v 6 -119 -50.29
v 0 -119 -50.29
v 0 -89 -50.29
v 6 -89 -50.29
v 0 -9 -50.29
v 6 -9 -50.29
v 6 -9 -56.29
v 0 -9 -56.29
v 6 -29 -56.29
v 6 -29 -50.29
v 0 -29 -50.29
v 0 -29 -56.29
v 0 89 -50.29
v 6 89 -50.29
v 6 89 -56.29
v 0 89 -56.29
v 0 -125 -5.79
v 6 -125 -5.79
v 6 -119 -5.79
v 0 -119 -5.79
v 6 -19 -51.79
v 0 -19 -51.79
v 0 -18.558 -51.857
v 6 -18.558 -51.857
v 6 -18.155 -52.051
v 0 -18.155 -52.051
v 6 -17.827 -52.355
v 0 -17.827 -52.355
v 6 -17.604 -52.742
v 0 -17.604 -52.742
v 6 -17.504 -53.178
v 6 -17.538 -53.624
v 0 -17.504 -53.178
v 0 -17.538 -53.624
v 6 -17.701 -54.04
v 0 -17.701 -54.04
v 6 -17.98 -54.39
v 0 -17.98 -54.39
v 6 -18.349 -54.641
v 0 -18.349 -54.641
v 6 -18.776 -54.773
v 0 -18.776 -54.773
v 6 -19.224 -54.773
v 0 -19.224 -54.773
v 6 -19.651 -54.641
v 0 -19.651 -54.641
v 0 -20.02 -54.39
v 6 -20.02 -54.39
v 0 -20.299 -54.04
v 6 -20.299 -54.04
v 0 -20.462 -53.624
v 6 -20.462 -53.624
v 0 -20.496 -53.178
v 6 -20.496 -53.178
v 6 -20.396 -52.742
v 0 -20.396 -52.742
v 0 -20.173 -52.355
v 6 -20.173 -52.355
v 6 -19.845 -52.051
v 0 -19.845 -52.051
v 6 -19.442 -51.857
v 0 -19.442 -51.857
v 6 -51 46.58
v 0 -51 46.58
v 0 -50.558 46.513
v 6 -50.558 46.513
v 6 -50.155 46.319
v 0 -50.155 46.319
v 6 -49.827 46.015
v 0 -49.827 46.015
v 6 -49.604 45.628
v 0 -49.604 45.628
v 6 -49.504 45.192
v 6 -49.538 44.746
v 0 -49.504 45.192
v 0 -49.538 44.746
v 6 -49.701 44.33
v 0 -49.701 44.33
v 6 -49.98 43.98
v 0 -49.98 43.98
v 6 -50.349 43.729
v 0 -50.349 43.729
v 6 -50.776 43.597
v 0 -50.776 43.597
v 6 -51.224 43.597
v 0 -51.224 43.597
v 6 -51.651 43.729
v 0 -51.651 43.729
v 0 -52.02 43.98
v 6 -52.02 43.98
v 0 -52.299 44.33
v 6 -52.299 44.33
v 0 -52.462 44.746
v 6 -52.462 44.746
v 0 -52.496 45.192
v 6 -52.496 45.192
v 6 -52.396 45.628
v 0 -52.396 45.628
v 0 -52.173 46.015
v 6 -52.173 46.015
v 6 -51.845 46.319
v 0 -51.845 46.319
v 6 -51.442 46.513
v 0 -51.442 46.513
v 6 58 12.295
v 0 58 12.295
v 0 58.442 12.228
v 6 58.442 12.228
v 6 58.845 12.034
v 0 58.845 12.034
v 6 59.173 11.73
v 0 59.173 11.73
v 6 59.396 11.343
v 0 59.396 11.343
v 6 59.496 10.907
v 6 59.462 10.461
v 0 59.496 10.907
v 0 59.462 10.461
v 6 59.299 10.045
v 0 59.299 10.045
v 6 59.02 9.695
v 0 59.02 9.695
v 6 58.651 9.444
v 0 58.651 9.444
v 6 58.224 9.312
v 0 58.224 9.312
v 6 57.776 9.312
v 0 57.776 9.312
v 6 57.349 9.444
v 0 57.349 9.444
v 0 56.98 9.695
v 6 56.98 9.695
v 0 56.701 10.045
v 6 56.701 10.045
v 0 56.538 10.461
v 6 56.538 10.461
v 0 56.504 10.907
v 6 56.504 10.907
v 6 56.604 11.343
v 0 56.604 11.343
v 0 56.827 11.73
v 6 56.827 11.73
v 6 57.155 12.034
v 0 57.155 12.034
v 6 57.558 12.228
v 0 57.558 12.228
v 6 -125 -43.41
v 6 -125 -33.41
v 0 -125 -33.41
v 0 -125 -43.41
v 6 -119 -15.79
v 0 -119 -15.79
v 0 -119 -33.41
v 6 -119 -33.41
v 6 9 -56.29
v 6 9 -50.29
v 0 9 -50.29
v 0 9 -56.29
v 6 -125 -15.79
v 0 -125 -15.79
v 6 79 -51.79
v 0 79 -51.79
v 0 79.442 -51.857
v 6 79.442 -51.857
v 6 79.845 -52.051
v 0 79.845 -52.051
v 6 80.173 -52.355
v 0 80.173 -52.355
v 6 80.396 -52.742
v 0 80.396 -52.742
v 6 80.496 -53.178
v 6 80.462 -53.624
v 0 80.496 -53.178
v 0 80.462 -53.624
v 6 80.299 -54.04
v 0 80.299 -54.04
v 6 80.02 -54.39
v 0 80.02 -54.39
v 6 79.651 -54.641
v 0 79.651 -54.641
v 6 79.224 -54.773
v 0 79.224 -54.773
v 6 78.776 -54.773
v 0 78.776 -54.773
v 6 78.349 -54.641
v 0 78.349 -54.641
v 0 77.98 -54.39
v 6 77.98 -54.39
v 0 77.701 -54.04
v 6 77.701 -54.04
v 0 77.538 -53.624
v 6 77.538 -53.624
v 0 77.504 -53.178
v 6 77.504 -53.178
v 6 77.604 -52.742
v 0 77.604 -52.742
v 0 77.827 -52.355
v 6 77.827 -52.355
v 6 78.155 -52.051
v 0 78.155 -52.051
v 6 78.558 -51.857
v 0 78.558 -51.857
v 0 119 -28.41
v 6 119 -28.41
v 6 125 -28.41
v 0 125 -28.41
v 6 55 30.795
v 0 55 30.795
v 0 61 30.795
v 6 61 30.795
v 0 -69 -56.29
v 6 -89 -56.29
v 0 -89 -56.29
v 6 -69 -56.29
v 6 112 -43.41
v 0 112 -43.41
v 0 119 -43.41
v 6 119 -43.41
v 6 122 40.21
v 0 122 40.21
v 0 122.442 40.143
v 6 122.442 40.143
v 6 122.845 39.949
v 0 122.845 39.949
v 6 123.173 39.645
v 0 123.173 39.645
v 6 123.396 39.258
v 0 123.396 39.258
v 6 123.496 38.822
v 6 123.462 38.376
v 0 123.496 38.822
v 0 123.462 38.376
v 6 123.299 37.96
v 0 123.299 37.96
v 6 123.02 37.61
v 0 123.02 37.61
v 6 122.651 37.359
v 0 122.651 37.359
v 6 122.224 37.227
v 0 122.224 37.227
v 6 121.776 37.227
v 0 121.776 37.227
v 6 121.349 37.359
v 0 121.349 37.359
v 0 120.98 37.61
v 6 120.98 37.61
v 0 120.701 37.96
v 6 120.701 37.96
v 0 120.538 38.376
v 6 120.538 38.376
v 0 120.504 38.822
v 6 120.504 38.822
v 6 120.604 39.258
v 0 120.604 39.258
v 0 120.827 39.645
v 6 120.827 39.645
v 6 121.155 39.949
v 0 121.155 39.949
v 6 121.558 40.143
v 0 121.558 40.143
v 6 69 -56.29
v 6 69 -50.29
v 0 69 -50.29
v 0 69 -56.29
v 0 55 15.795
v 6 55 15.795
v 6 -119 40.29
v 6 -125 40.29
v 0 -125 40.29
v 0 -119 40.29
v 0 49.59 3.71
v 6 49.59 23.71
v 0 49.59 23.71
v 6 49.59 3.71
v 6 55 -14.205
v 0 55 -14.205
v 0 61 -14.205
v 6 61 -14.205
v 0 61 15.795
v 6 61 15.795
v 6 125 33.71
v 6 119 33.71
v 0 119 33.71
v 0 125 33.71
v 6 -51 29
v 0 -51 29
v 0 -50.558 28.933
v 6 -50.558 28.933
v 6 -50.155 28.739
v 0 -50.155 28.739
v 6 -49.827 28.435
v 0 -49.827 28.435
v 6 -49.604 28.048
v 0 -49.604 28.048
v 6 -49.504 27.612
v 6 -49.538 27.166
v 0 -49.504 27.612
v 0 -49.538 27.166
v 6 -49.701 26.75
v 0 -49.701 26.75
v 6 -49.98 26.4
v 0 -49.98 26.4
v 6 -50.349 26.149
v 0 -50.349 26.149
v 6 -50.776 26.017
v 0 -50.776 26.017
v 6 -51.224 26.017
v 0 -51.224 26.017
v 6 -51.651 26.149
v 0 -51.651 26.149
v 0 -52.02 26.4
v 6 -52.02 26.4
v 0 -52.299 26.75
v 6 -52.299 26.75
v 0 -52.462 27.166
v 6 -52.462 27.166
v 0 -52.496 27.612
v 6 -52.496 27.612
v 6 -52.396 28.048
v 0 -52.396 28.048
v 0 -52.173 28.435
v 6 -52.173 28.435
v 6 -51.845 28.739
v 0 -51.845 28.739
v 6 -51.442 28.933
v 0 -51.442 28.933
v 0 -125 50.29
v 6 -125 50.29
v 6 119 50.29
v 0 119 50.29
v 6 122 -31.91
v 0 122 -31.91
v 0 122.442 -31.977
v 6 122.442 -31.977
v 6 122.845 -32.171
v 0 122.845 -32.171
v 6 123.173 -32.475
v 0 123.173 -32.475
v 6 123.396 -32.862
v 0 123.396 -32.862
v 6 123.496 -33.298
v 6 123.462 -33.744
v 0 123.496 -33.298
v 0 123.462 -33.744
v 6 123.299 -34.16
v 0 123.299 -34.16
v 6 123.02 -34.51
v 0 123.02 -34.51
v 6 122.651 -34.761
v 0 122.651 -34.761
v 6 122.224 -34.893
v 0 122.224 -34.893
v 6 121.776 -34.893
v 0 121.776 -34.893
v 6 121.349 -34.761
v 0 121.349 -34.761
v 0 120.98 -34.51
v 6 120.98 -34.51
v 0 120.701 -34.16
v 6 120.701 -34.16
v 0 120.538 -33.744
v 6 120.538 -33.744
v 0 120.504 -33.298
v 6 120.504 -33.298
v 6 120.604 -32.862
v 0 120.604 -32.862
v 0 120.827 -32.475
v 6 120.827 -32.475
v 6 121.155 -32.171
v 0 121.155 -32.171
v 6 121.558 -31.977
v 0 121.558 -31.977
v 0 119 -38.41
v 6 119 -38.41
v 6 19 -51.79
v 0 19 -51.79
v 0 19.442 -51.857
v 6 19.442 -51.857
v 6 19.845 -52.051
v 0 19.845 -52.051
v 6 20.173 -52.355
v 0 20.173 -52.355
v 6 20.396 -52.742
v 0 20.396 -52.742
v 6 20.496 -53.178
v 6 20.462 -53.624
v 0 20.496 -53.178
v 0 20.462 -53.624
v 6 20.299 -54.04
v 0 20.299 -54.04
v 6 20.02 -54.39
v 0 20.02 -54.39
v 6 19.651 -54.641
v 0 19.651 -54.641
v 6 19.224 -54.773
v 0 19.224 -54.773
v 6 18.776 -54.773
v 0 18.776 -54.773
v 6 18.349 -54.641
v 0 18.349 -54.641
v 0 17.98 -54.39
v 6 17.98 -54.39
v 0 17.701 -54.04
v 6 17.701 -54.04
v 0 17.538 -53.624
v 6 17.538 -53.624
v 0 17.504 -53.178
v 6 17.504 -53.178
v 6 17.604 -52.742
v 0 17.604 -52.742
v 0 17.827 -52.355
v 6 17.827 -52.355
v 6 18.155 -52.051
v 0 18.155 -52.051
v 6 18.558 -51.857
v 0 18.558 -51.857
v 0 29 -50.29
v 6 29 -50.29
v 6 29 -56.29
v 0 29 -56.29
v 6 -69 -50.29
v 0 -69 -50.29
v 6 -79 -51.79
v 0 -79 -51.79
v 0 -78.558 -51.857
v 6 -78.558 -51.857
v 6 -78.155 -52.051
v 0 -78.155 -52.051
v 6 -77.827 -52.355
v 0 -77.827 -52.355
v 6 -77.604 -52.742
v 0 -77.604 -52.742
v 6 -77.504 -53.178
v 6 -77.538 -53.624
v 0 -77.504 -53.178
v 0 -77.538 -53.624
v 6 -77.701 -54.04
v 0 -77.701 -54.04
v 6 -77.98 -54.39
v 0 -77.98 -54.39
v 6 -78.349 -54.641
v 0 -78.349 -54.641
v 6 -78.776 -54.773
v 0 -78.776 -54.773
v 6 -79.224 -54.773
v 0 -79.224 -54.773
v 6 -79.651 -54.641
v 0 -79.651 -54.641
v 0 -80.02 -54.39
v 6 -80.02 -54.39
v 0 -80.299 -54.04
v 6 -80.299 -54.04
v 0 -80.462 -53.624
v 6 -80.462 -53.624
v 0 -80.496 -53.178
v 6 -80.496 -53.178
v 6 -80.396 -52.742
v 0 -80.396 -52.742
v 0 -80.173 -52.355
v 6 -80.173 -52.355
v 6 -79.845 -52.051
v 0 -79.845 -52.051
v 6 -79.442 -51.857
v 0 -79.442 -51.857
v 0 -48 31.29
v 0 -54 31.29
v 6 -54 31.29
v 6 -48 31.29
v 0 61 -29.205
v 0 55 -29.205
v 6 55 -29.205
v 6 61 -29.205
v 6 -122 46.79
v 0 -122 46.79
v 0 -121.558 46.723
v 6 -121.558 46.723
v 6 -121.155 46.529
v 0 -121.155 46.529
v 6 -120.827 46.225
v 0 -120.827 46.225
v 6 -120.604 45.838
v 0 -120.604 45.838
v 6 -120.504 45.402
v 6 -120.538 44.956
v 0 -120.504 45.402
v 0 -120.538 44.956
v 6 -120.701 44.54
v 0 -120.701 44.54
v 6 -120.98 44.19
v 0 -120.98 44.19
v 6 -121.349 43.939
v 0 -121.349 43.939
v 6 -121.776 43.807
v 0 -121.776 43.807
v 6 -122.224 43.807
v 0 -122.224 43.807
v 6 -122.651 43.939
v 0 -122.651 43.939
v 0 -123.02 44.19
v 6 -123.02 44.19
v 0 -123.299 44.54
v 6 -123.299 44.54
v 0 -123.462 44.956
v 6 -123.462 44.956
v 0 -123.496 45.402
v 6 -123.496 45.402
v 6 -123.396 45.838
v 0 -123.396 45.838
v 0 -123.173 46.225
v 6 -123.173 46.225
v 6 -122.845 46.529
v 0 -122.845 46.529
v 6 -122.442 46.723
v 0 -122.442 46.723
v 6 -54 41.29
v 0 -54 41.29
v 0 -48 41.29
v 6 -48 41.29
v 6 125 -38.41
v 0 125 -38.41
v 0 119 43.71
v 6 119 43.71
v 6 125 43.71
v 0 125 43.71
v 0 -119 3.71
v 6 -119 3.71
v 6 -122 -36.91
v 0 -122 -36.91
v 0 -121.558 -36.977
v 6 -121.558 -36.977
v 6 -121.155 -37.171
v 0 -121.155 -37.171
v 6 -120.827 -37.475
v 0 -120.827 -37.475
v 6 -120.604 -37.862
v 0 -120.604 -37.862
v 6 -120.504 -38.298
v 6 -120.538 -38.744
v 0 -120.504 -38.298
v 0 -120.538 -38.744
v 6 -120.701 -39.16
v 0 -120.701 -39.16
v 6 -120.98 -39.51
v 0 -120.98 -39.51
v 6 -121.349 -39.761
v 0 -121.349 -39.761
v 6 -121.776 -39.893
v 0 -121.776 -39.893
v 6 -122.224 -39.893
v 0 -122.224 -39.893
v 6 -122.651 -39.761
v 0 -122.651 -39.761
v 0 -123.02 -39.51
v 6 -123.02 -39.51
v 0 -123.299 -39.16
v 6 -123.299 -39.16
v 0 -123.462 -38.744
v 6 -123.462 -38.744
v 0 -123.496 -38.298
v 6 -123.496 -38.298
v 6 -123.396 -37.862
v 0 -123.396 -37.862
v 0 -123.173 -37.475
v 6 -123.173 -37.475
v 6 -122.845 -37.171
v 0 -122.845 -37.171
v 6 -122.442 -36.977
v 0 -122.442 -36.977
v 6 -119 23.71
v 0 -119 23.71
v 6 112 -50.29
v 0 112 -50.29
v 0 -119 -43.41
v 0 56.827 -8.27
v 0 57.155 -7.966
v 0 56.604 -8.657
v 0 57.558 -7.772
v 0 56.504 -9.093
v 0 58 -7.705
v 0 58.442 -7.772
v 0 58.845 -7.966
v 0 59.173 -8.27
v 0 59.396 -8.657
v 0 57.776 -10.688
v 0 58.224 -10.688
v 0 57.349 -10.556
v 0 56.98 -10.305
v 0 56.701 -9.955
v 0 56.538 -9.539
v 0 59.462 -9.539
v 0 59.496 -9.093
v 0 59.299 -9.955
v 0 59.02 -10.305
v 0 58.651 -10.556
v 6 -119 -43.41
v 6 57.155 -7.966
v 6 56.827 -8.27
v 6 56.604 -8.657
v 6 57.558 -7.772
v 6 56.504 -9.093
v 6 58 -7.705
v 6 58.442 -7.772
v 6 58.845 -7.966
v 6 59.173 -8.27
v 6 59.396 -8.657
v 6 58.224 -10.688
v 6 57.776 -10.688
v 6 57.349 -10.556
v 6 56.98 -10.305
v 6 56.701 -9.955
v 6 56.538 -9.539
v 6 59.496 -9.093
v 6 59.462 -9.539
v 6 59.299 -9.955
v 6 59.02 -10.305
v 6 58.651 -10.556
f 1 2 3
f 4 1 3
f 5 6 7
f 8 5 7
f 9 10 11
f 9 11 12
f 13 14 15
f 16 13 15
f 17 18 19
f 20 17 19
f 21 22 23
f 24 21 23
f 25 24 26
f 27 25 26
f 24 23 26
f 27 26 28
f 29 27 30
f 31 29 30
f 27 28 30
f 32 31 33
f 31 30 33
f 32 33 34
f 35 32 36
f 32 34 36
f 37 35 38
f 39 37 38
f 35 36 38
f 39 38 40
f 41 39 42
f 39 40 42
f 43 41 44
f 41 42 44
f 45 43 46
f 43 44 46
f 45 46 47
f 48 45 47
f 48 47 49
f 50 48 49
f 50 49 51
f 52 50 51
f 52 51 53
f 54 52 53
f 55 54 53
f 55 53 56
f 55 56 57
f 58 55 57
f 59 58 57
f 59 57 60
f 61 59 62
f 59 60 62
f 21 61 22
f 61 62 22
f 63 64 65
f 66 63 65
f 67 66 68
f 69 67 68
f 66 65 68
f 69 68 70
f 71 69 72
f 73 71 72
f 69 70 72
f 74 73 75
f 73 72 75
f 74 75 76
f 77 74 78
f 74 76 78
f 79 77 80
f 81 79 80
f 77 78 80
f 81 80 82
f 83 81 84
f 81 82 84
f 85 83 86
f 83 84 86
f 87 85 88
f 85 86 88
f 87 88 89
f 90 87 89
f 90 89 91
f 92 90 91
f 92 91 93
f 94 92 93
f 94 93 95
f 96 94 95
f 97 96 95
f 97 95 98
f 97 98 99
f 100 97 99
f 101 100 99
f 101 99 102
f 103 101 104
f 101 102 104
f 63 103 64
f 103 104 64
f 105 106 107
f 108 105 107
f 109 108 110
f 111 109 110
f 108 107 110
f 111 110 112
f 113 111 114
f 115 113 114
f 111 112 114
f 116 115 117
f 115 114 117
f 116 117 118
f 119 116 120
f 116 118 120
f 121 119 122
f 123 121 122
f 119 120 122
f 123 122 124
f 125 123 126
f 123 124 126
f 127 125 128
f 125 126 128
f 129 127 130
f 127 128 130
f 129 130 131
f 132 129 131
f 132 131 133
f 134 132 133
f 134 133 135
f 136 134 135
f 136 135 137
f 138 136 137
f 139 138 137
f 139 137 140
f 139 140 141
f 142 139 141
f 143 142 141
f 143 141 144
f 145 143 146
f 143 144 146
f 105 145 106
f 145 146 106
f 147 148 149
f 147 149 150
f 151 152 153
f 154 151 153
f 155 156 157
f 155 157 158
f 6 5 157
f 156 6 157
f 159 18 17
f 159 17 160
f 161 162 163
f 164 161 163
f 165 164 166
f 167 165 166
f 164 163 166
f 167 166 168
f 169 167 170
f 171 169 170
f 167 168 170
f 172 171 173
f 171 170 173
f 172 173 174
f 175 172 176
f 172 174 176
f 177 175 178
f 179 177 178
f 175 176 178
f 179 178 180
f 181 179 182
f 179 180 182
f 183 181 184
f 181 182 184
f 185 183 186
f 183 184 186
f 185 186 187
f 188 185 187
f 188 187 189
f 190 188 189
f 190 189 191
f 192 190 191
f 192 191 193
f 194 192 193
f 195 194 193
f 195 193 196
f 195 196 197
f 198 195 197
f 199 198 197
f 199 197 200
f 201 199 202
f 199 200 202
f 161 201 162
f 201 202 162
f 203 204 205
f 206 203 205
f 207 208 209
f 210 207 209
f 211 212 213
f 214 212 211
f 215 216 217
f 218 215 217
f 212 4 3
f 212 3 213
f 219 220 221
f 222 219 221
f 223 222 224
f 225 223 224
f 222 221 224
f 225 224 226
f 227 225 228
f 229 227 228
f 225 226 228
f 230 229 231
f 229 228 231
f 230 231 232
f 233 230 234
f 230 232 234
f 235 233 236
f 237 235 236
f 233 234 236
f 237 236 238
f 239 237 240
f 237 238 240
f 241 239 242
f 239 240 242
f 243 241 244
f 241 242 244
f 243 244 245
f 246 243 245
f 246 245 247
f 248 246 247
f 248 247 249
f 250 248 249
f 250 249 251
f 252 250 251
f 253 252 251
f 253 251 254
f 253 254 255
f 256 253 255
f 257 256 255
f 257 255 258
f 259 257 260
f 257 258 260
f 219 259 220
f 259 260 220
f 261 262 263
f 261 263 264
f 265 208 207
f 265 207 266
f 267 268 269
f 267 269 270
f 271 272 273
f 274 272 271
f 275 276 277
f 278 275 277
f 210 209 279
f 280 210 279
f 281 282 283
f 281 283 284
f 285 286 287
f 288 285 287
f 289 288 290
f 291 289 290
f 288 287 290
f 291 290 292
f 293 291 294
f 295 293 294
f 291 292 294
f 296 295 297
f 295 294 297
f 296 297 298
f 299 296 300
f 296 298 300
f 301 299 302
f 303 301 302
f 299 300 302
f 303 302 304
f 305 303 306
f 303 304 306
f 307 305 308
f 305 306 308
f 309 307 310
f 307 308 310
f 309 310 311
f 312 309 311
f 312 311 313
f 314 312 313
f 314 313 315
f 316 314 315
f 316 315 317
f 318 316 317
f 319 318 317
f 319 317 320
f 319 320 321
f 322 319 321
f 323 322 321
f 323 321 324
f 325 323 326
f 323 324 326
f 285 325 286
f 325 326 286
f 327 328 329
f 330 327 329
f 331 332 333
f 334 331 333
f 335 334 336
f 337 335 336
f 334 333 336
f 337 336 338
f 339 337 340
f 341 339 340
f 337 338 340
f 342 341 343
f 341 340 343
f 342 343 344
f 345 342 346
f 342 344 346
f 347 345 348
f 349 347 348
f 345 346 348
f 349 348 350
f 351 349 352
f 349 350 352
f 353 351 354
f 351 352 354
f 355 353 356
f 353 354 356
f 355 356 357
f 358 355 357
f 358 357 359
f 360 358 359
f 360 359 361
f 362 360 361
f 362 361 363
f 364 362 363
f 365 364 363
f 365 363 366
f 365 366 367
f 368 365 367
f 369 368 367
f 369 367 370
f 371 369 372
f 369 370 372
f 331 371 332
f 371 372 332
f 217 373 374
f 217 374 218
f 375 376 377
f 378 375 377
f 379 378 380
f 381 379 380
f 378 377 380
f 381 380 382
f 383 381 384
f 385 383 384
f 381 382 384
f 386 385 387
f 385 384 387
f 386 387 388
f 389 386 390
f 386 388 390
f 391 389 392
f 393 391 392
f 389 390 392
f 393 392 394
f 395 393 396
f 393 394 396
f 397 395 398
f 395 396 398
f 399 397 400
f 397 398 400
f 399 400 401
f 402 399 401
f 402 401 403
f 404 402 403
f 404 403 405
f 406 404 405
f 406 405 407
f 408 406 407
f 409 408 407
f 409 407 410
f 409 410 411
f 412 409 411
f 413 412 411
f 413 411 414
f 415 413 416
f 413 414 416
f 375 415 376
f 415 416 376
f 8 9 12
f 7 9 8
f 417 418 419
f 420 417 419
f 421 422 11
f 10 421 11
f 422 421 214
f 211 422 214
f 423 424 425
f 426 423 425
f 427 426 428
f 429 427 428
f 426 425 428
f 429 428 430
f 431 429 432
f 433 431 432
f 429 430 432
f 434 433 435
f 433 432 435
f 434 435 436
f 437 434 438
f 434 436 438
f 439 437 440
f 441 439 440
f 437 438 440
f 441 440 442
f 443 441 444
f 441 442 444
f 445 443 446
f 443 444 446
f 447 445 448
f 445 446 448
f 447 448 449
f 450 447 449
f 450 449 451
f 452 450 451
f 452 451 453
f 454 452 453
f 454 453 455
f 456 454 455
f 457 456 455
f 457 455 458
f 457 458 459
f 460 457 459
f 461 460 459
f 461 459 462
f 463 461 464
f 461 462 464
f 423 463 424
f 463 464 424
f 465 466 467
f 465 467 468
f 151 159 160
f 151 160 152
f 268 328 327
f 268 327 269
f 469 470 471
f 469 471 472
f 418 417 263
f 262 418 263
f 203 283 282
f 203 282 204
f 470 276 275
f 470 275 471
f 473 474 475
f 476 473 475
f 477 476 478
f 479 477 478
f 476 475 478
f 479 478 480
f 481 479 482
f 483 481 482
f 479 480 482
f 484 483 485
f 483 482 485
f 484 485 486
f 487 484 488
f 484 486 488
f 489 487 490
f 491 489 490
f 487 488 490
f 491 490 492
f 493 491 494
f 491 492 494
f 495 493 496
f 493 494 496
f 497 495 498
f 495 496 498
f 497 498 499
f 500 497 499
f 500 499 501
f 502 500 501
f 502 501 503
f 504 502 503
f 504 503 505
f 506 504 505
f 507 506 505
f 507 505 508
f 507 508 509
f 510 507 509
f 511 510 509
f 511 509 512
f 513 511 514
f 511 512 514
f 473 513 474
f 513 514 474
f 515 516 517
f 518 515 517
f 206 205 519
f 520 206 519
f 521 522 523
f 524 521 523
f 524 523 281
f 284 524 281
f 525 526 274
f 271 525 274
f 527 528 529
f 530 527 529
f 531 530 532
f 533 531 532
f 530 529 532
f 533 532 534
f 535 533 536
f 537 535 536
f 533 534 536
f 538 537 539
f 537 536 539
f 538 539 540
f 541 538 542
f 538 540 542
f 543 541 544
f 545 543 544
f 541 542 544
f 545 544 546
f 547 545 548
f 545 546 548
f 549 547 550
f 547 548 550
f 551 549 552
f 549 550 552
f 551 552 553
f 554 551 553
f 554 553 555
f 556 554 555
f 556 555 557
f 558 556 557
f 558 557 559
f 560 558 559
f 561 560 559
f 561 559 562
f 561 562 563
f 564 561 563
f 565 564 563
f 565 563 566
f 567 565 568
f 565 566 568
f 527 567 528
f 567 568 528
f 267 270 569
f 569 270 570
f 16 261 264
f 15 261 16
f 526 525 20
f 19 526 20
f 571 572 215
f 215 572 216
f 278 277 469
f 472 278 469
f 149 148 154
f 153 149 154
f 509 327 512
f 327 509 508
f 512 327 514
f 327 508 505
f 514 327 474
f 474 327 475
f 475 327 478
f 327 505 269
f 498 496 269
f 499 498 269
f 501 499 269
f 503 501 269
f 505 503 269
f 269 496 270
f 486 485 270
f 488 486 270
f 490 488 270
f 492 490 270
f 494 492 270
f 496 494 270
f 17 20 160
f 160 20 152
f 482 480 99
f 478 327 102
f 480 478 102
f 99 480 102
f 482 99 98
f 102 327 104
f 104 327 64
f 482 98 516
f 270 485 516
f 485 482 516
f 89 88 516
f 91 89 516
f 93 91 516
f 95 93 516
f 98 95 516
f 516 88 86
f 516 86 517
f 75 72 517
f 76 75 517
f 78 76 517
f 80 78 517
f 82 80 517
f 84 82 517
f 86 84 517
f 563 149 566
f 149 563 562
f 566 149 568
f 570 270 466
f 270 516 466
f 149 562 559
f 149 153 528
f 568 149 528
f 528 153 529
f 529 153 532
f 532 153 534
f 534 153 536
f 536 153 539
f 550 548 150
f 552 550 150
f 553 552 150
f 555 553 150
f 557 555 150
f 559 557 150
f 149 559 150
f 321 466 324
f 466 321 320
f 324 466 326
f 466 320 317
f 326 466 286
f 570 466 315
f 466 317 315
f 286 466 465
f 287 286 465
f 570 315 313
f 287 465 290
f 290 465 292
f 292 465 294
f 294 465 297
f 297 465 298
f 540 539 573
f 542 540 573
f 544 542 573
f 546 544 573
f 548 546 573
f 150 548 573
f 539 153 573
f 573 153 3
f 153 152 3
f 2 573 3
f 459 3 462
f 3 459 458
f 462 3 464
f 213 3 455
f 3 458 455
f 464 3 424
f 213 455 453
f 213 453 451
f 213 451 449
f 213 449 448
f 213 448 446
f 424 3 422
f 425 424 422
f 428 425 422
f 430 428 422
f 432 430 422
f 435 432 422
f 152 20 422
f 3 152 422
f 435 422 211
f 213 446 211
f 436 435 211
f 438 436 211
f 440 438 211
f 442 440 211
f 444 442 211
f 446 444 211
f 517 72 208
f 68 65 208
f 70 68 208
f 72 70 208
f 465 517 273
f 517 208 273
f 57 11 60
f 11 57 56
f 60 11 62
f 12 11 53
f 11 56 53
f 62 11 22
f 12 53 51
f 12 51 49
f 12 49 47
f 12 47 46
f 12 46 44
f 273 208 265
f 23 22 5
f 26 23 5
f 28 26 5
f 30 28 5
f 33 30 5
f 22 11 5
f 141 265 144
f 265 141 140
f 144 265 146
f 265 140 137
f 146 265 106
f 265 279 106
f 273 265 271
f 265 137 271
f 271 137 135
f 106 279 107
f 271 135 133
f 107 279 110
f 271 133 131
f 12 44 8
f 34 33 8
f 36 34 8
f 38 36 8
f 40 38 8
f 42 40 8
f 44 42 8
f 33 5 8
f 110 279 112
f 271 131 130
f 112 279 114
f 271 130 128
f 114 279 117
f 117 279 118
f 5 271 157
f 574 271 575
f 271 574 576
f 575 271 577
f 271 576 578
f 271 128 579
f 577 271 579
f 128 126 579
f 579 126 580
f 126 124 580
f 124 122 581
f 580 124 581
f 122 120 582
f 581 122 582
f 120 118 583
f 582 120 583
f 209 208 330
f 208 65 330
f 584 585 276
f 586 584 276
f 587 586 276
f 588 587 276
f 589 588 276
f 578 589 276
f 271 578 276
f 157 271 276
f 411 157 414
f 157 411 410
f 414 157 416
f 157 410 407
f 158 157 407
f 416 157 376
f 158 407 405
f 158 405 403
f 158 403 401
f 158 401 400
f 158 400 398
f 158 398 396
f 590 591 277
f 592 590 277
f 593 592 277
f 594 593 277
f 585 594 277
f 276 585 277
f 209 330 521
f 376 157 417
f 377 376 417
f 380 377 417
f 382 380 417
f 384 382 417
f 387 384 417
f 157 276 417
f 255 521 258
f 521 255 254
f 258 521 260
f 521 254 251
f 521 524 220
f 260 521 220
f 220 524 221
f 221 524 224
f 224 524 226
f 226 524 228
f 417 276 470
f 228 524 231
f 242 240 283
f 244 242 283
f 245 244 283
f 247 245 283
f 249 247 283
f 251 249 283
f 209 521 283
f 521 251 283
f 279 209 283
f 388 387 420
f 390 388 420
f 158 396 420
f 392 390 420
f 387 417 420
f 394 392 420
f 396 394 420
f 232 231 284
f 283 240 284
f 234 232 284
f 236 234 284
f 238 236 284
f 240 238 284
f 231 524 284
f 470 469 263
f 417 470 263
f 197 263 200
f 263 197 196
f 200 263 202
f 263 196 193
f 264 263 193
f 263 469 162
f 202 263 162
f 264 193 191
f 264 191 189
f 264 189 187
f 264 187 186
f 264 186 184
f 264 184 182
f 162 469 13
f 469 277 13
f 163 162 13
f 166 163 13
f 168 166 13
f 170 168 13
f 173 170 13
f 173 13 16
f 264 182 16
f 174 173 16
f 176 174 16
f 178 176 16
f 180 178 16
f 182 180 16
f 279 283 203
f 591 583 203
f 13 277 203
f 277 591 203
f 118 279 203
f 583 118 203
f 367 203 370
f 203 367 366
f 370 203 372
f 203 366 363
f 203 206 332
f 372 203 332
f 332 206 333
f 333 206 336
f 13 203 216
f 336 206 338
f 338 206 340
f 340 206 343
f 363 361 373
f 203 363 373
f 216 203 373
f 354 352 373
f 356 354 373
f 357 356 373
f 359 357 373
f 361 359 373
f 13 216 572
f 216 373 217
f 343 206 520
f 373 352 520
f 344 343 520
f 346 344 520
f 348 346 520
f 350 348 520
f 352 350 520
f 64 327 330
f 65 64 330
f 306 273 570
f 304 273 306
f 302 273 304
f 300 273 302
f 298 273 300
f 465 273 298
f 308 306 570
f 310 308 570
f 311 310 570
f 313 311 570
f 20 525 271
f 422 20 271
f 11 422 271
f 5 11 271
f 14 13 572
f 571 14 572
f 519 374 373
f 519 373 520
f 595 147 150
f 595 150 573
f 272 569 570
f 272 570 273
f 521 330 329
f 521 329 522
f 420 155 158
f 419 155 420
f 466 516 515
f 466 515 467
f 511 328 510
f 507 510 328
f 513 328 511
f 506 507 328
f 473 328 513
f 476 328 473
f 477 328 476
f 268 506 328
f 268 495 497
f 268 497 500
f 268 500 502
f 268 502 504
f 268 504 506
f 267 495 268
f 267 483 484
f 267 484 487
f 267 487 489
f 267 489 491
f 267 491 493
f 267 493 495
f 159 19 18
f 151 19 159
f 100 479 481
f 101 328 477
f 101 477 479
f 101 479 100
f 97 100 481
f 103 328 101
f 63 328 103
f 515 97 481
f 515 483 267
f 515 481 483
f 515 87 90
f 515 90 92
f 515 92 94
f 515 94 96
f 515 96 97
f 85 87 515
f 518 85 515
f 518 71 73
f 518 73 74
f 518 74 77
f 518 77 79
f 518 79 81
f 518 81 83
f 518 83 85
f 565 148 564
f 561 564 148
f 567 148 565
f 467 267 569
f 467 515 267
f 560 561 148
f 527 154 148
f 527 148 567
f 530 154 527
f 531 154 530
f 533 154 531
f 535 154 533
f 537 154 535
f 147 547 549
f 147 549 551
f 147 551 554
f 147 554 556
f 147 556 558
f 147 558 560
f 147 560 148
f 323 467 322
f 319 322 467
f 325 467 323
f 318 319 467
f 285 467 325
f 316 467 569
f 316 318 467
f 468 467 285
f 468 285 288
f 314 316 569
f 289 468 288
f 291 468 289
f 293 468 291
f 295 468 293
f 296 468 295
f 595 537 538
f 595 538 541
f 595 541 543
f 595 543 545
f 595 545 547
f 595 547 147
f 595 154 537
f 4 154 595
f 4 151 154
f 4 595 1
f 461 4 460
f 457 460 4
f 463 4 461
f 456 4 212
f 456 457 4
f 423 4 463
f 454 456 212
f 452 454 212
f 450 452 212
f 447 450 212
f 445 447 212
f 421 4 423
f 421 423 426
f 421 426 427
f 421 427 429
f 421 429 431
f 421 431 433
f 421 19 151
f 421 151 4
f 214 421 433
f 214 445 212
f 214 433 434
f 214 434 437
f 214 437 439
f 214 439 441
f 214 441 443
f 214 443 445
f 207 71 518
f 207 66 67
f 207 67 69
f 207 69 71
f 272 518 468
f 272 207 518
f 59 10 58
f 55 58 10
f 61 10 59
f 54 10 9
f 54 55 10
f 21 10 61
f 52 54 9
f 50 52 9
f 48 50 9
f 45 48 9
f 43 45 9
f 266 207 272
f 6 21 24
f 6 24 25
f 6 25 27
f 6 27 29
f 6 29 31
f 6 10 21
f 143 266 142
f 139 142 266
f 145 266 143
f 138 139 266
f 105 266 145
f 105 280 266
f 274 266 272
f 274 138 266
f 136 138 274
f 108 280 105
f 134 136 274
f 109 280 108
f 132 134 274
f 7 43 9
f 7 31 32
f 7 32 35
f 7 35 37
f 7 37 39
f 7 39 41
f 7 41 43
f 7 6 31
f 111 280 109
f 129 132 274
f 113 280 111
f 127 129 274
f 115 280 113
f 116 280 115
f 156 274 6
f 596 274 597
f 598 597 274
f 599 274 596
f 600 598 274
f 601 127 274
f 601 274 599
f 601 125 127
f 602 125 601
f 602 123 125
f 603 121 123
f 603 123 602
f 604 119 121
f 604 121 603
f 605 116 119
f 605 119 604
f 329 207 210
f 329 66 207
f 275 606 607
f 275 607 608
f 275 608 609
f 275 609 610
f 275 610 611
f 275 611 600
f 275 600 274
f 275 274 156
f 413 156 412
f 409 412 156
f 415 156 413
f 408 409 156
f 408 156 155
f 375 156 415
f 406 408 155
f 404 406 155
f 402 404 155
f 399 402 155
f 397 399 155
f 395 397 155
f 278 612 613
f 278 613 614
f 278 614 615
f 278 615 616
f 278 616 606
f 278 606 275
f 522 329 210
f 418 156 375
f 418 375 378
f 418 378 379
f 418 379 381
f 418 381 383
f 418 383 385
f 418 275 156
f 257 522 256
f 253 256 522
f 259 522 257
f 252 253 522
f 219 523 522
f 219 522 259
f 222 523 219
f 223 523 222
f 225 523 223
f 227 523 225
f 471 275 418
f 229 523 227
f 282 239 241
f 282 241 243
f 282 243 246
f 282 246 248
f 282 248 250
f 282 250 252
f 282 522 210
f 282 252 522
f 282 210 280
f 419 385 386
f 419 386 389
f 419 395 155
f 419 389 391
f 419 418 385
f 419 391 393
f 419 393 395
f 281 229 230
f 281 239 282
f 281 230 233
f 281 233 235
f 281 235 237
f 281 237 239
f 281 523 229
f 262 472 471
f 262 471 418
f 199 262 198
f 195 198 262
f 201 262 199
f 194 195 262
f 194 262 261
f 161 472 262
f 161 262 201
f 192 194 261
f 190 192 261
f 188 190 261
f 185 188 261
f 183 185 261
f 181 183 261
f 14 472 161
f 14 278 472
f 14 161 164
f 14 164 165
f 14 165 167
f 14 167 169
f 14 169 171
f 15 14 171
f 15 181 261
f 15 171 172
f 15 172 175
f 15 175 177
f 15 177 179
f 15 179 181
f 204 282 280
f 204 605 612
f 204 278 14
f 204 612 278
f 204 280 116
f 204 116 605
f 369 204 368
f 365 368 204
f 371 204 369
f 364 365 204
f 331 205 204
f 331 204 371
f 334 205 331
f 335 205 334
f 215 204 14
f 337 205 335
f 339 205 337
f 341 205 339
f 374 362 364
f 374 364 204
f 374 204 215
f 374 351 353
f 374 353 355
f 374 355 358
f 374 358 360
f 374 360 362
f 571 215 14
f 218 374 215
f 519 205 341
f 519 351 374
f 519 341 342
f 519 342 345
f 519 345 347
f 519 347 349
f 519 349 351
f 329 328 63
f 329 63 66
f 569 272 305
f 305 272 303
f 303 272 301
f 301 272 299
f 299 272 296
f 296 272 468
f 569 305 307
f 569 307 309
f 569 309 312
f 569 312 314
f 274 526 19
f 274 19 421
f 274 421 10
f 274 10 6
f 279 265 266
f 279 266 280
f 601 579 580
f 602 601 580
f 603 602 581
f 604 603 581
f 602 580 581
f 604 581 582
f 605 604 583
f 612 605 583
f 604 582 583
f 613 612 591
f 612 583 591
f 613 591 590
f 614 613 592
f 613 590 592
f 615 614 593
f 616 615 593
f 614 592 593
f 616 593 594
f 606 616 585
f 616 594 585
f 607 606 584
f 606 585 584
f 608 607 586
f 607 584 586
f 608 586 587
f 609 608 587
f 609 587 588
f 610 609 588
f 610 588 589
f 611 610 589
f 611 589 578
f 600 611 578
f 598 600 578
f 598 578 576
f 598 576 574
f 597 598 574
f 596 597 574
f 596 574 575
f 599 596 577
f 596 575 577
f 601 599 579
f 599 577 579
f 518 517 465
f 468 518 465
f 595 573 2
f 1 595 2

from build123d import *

# Parameters (mm, degrees)
ESQUISSE1_W             = 100.58
ESQUISSE1_H             = 238
ESQUISSE1_W_2           = 10
ESQUISSE1_H_2           = 6
ESQUISSE1_W_3           = 15
BOSS_EXTRU_1_DEPTH      = 6
ESQUISSE3_W             = 10
ESQUISSE3_H             = 6
ESQUISSE3_W_2           = 6
ESQUISSE3_H_2           = 20
BOSS_EXTRU_5_DEPTH      = 6
ESQUISSE6_W             = 20
ESQUISSE6_H             = 168.59
ENL_V_MAT_EXTRU_2_DEPTH = 6
ESQUISSE7_W             = 6.88
ESQUISSE7_H             = 7
ENL_V_MAT_EXTRU_3_DEPTH = 6
ESQUISSE8_R             = 1.5
ENL_V_MAT_EXTRU_4_DEPTH = 6


with BuildPart() as part:
    # Esquisse1 → Boss.-Extru.1 (new body)
    with BuildSketch(Plane(origin=(0, 0, 0), x_dir=(0, 0, -1), z_dir=(1, 0, 0))):
        Rectangle(ESQUISSE1_W, ESQUISSE1_H)
        with Locations((-36.29, -51)):
            Rectangle(ESQUISSE1_W_2, ESQUISSE1_H_2, mode=Mode.SUBTRACT)
        with Locations((-23.295, 58)):
            Rectangle(ESQUISSE1_W_3, ESQUISSE1_H_2, mode=Mode.SUBTRACT)
        with Locations((21.705, 58)):
            Rectangle(ESQUISSE1_W_3, ESQUISSE1_H_2, mode=Mode.SUBTRACT)
    extrude(amount=BOSS_EXTRU_1_DEPTH)

    # Esquisse3 → Boss.-Extru.5 (add)
    with BuildSketch(Plane(origin=(6, 0, 0), x_dir=(0, 0, -1), z_dir=(1, 0, 0))):
        with Locations((-45.29, -122)):
            Rectangle(ESQUISSE3_W, ESQUISSE3_H)
        with Locations((38.41, -122)):
            Rectangle(ESQUISSE3_W, ESQUISSE3_H)
        with Locations((53.29, 19)):
            Rectangle(ESQUISSE3_W_2, ESQUISSE3_H_2)
        with Locations((53.29, 79)):
            Rectangle(ESQUISSE3_W_2, ESQUISSE3_H_2)
        with Locations((53.29, -79)):
            Rectangle(ESQUISSE3_W_2, ESQUISSE3_H_2)
        with Locations((53.29, -19)):
            Rectangle(ESQUISSE3_W_2, ESQUISSE3_H_2)
        with Locations((10.79, -122)):
            Rectangle(ESQUISSE3_W, ESQUISSE3_H)
        with Locations((33.41, 122)):
            Rectangle(ESQUISSE3_W, ESQUISSE3_H)
        with Locations((-38.71, 122)):
            Rectangle(ESQUISSE3_W, ESQUISSE3_H)
    extrude(amount=-BOSS_EXTRU_5_DEPTH)

    # Esquisse6 → Enlèv. mat.-Extru.2 (cut)
    with BuildSketch(Plane(origin=(6, 0, 0), x_dir=(0, 0, -1), z_dir=(1, 0, 0))):
        with Locations((-13.71, -34.705)):
            Rectangle(ESQUISSE6_W, ESQUISSE6_H)
    extrude(amount=-ENL_V_MAT_EXTRU_2_DEPTH, mode=Mode.SUBTRACT)

    # Esquisse7 → Enlèv. mat.-Extru.3 (cut)
    with BuildSketch(Plane.ZY):
        with Locations((-46.85, 115.5)):
            Rectangle(ESQUISSE7_W, ESQUISSE7_H)
    extrude(amount=-ENL_V_MAT_EXTRU_3_DEPTH, mode=Mode.SUBTRACT)

    # Esquisse8 → Enlèv. mat.-Extru.4 (cut)
    with BuildSketch(Plane.ZY):
        with Locations((-9.205, 58)):
            Circle(ESQUISSE8_R)
        with Locations((10.795, 58)):
            Circle(ESQUISSE8_R)
        with Locations((27.5, -51)):
            Circle(ESQUISSE8_R)
        with Locations((45.08, -51)):
            Circle(ESQUISSE8_R)
        with Locations((38.71, 122)):
            Circle(ESQUISSE8_R)
        with Locations((-33.41, 122)):
            Circle(ESQUISSE8_R)
        with Locations((45.29, -122)):
            Circle(ESQUISSE8_R)
        with Locations((-53.29, 79)):
            Circle(ESQUISSE8_R)
        with Locations((-38.41, -122)):
            Circle(ESQUISSE8_R)
        with Locations((-53.29, 19)):
            Circle(ESQUISSE8_R)
        with Locations((-53.29, -79)):
            Circle(ESQUISSE8_R)
        with Locations((-53.29, -19)):
            Circle(ESQUISSE8_R)
    extrude(amount=-ENL_V_MAT_EXTRU_4_DEPTH, mode=Mode.SUBTRACT)


solid = part.part
